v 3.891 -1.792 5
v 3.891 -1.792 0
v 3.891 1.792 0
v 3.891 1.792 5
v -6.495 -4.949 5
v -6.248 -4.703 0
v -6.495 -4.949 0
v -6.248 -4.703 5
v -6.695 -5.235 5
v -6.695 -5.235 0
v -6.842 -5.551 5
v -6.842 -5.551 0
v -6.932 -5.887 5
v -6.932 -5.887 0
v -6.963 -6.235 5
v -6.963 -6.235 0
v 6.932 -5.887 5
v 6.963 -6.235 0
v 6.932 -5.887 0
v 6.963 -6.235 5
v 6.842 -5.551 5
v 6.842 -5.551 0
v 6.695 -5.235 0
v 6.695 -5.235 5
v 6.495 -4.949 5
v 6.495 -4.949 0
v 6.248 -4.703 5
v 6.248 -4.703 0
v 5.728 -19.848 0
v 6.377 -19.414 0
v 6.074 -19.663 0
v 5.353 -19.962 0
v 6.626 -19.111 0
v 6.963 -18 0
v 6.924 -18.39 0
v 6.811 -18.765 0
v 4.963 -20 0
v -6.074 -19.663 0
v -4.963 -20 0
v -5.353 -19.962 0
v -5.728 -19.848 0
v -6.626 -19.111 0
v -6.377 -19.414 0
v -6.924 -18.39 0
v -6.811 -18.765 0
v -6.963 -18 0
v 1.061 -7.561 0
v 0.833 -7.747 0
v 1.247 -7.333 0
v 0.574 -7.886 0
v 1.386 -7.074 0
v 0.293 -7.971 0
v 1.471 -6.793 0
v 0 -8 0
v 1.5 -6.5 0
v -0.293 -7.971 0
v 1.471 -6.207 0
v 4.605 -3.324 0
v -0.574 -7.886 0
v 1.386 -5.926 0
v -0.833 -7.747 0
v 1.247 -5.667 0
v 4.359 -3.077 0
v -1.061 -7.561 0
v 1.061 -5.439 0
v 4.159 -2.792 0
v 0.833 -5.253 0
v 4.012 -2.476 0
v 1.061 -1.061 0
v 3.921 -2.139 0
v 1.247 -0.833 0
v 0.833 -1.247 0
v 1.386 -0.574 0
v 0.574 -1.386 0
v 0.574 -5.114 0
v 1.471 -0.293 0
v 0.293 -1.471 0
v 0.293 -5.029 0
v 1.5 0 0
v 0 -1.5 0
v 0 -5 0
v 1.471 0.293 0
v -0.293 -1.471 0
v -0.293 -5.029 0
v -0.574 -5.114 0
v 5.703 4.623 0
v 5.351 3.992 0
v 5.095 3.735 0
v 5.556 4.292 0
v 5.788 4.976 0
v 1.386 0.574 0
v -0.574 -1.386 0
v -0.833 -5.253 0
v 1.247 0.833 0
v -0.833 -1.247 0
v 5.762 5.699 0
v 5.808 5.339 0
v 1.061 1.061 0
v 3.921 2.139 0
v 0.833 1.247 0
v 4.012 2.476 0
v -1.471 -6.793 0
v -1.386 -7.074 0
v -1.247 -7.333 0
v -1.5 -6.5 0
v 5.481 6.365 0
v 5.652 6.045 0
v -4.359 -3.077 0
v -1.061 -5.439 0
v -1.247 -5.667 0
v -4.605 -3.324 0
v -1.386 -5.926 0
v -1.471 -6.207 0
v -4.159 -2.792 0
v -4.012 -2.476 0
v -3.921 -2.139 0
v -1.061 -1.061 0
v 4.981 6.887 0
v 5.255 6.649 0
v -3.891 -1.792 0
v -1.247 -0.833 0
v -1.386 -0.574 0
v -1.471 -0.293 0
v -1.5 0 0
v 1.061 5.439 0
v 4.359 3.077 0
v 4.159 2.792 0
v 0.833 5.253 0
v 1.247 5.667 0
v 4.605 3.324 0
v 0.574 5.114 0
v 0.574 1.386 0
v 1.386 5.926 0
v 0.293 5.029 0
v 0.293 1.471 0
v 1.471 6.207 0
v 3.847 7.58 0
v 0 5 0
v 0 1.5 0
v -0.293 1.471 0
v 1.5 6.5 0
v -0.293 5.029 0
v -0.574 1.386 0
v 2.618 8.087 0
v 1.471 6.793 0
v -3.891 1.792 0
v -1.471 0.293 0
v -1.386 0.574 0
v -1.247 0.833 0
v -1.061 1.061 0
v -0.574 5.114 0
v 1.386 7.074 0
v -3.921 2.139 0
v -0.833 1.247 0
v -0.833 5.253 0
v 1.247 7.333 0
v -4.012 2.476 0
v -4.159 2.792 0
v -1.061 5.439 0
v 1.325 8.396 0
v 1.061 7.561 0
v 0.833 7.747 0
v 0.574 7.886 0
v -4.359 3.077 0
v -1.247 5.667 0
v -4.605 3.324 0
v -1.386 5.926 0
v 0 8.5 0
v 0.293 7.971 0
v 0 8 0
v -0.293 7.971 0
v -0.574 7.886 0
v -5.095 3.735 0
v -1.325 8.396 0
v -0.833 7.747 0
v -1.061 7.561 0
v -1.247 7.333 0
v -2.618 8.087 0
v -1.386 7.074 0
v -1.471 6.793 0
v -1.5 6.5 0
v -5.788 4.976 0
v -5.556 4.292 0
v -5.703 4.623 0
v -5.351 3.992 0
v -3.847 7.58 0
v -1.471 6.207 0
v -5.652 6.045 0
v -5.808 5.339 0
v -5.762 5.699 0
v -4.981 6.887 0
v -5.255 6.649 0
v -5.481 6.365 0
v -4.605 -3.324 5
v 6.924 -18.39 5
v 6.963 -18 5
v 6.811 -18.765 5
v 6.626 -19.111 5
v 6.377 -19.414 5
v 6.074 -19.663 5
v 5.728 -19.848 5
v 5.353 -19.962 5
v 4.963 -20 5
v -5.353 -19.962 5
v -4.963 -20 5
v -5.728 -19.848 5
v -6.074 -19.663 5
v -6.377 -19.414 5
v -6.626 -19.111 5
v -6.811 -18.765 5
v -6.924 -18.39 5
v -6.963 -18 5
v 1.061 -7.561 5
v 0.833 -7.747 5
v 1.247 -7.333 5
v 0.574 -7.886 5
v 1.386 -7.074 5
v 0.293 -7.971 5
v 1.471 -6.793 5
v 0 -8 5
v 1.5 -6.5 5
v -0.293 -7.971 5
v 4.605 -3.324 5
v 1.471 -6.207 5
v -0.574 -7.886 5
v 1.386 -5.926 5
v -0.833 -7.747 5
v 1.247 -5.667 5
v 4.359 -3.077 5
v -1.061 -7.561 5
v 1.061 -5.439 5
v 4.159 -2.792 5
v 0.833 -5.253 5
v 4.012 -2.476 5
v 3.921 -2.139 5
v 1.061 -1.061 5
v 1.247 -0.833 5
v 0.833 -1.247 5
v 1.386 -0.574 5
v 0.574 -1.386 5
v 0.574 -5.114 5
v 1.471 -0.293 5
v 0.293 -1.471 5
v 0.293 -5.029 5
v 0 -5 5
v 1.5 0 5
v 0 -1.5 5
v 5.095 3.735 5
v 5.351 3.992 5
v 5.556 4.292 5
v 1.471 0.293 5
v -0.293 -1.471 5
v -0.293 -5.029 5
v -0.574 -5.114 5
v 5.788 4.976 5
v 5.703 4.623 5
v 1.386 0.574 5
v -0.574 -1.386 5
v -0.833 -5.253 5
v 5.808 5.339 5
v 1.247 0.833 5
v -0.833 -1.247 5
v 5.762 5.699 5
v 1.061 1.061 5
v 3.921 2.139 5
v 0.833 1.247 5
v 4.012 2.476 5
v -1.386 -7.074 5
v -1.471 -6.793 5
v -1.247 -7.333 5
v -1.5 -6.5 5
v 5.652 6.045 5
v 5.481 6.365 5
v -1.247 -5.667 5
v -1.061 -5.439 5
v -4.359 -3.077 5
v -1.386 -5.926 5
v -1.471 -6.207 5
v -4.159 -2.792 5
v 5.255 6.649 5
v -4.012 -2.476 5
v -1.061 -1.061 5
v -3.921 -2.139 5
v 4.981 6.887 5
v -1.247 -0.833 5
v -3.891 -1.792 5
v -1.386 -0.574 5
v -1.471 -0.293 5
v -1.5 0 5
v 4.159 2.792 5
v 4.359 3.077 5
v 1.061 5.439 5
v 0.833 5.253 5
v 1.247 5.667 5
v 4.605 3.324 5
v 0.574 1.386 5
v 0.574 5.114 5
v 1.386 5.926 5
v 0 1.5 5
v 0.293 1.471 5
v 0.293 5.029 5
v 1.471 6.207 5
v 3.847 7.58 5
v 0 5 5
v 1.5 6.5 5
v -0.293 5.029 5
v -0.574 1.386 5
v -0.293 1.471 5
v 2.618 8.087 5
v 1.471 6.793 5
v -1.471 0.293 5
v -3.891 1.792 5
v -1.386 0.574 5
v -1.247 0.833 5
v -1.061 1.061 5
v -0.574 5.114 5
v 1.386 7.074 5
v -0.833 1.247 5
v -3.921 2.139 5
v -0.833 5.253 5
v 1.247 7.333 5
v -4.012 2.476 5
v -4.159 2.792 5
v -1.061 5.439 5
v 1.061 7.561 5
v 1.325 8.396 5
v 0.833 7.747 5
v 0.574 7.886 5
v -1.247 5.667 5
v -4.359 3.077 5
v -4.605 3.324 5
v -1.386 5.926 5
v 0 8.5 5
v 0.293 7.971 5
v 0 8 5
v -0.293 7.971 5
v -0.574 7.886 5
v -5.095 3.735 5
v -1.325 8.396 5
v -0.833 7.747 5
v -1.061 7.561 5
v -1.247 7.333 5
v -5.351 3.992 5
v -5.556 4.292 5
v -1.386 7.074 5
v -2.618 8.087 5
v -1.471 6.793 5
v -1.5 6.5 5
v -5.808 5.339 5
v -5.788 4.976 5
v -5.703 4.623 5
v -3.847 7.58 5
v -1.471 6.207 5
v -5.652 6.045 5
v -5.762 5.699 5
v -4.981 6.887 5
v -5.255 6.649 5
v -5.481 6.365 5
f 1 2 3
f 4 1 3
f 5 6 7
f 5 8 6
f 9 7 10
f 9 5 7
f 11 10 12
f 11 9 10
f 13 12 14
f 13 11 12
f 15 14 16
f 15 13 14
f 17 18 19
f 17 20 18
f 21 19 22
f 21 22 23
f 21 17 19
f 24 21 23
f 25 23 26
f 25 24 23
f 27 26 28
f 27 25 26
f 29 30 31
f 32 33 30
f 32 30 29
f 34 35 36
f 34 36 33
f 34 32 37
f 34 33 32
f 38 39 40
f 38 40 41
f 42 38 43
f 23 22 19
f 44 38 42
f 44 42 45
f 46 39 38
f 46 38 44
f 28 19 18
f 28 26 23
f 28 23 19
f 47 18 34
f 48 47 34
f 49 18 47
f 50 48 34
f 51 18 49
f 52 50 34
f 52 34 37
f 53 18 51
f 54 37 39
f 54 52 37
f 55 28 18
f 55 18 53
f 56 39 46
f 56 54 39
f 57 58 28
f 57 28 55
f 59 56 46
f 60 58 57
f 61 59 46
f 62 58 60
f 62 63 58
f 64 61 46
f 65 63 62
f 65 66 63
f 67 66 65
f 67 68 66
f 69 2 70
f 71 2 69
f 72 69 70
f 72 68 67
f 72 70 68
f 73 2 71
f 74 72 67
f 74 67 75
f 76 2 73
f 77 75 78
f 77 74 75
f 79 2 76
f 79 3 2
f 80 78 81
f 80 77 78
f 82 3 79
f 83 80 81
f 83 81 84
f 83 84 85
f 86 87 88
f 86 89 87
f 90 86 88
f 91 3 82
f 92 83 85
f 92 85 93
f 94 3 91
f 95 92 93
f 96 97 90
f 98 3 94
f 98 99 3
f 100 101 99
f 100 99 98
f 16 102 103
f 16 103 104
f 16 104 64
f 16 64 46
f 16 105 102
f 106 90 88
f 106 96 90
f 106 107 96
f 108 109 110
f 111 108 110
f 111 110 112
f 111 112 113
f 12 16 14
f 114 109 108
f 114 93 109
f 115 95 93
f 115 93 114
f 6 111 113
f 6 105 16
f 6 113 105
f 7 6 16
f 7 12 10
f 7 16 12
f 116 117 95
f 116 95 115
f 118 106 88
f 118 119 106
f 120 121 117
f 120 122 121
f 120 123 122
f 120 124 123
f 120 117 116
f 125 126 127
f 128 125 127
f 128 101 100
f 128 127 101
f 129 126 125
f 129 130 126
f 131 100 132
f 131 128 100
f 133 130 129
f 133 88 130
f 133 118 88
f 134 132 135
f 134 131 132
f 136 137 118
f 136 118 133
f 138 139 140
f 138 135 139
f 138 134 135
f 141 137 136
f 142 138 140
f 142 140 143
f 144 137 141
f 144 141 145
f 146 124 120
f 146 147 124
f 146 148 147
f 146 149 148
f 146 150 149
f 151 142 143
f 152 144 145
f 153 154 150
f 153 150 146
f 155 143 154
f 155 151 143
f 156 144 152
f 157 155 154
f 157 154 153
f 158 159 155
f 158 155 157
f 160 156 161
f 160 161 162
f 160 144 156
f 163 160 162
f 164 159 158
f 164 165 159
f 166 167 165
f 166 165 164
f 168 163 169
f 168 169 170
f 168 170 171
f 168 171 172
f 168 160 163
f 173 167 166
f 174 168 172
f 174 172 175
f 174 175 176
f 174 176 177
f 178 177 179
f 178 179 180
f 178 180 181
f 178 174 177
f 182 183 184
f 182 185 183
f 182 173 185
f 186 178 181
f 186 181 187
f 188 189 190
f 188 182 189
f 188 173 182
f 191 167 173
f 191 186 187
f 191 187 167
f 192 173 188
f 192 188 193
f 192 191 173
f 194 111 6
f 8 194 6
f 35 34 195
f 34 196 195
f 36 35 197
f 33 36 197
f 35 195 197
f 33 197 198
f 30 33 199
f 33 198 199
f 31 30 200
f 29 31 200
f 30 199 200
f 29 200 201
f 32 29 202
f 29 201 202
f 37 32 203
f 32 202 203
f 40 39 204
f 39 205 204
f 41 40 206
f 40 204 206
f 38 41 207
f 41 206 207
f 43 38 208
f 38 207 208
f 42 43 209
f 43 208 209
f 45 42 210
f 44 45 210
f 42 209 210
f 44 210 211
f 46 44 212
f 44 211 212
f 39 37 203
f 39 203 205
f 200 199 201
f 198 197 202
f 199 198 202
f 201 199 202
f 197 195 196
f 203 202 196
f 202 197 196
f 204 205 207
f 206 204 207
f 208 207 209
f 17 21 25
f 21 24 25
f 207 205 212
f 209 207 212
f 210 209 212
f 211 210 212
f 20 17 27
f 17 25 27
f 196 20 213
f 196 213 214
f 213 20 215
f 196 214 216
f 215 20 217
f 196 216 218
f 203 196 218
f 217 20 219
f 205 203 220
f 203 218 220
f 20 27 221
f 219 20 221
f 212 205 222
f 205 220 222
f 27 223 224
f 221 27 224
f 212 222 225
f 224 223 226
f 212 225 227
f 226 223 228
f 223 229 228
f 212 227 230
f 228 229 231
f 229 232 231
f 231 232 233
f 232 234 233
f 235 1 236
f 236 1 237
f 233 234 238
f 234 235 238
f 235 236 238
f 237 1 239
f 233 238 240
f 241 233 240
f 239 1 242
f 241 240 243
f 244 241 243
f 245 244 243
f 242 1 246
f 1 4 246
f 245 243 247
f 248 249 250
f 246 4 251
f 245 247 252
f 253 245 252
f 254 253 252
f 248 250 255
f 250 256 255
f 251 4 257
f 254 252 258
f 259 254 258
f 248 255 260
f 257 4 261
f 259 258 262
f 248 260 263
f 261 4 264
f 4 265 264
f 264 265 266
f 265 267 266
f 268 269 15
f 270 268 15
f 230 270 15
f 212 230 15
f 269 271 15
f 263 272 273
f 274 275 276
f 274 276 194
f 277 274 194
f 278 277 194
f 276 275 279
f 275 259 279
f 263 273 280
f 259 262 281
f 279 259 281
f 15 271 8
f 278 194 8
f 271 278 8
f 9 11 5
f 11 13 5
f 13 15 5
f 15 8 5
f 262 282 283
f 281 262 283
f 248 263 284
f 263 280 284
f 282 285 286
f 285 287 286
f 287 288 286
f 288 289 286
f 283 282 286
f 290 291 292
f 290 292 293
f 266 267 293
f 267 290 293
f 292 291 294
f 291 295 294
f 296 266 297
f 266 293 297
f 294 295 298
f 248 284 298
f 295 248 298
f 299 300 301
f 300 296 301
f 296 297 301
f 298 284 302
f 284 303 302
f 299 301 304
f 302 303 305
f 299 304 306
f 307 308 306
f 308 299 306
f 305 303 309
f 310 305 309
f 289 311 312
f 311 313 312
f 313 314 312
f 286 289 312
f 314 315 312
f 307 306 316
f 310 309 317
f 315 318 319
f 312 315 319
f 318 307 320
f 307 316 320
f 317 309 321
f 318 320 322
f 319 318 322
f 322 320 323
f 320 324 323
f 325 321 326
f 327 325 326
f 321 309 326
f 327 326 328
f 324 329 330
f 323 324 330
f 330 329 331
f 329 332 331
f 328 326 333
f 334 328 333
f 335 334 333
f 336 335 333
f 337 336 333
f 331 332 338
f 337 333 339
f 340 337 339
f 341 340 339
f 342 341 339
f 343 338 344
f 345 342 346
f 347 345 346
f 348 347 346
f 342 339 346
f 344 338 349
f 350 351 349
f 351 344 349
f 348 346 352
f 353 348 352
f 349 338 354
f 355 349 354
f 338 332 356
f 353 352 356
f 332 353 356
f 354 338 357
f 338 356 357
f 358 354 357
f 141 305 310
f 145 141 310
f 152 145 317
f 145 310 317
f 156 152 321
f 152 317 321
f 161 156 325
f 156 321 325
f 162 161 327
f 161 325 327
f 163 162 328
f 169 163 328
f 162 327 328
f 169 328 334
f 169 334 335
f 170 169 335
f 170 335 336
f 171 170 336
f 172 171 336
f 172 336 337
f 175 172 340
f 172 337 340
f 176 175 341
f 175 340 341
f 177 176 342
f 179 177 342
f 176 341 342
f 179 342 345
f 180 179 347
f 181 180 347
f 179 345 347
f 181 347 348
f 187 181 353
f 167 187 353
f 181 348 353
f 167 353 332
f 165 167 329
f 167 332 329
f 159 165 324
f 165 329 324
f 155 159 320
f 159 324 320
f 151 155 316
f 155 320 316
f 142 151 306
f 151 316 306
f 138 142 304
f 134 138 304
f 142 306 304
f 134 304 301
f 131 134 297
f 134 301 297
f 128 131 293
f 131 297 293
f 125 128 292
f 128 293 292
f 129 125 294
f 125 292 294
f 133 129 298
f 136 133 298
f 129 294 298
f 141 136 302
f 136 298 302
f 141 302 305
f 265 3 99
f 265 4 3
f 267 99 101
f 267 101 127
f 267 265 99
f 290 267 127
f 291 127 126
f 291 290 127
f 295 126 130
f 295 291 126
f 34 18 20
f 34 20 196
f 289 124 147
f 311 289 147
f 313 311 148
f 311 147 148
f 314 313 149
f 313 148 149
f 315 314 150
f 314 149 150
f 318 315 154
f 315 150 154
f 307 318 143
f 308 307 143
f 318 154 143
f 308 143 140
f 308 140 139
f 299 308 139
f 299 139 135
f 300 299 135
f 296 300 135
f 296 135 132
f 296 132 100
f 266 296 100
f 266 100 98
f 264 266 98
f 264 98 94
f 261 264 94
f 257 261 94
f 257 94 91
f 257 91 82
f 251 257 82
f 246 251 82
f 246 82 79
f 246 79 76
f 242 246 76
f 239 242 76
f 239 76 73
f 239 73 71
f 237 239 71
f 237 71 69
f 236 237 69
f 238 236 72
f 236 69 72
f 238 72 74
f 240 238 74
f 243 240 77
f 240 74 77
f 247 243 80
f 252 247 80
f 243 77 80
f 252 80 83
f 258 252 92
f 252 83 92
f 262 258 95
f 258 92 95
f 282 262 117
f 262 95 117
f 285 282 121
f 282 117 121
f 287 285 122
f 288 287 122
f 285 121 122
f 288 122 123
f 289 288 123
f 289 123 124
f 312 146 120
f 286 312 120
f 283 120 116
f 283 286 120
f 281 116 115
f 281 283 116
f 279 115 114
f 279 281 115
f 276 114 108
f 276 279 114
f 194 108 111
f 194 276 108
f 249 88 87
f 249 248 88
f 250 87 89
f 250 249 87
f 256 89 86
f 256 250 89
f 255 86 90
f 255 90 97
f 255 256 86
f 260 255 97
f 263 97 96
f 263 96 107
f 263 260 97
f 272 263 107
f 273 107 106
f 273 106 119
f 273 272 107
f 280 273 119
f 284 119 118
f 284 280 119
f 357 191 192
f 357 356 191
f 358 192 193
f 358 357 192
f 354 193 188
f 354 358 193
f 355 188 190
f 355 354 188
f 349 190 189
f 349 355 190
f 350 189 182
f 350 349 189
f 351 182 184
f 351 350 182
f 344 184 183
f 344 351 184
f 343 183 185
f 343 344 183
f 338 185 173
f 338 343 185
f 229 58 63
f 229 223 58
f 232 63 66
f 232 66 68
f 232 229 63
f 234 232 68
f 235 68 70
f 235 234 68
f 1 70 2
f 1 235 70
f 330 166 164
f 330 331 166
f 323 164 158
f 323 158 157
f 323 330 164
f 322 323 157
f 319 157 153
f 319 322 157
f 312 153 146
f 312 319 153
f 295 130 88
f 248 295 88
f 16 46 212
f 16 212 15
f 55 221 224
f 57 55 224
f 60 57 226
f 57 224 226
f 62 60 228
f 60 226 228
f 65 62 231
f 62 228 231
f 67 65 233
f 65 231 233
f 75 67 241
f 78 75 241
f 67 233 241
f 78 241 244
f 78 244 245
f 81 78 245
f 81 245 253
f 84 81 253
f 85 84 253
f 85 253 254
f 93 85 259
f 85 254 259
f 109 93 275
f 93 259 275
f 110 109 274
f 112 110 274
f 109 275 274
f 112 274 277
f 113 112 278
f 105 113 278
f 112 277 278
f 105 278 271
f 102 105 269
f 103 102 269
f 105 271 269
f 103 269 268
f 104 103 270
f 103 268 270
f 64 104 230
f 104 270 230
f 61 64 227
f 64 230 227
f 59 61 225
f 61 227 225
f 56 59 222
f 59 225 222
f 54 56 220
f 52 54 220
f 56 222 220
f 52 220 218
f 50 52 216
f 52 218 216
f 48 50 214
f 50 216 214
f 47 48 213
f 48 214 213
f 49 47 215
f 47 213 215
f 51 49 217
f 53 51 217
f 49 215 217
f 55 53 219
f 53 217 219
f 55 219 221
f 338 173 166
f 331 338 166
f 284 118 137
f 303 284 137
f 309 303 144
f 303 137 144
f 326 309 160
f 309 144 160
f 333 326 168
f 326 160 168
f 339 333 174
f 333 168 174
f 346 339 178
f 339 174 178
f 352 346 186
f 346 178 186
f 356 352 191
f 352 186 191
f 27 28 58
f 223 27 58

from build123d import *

# Parameters (mm, degrees)
SKETCH_1_R          = 8.5
EXTRUDE_1_DEPTH     = 5
SKETCH_2_R          = 1.5
CUT_EXTRUDE_1_DEPTH = 5
CUT_EXTRUDE_2_DEPTH = 14.019216566
EXTRUDE_2_DEPTH     = 5
SKETCH_6_R          = 1.5
CUT_EXTRUDE_3_DEPTH = 22.759606561
FILLET_2_R          = 2


with BuildPart() as part:
    # 草图1 → 凸台-拉伸1 (new body)
    with BuildSketch(Plane.XY):
        Circle(SKETCH_1_R)
    extrude(amount=EXTRUDE_1_DEPTH)

    # 草图2 → 切除-拉伸1 (cut)
    with BuildSketch(Plane.XY.offset(5)):
        with Locations((0, 6.5)):
            Circle(SKETCH_2_R)
        with Locations((0, -6.5)):
            Circle(SKETCH_2_R)
    extrude(amount=-CUT_EXTRUDE_1_DEPTH, mode=Mode.SUBTRACT)

    # 草图3 → 切除-拉伸2 (cut, through all)
    with BuildSketch(Plane(origin=(0, 0, 0), x_dir=(-1, 0, 0), z_dir=(0, 0, -1))):
        with BuildLine():
            ThreePointArc((3.89097221, 2.724488073), (4.530155516, 1.428352548), (4.75, 0))
            Line((4.75, 0), (8.5, 0))
            ThreePointArc((8.5, 0), (8.106594081, 2.555999296), (6.962792376, 4.875399709))
            Line((6.962792376, 4.875399709), (3.89097221, 2.724488073))
        make_face()
        with BuildLine():
            Line((8.5, 0), (4.75, 0))
            ThreePointArc((4.75, 0), (4.530155516, -1.428352548), (3.89097221, -2.724488073))
            Line((3.89097221, -2.724488073), (6.962792376, -4.875399709))
            ThreePointArc((6.962792376, -4.875399709), (8.106594081, -2.555999296), (8.5, 0))
        make_face()
    cut_extrude_2 = extrude(amount=-CUT_EXTRUDE_2_DEPTH, mode=Mode.SUBTRACT)

    # 镜向1: 切除-拉伸2 across plane
    add(cut_extrude_2.mirror(Plane(origin=(0, 0, 0), x_dir=(0, 0, 1), z_dir=(1, 0, 0))), mode=Mode.SUBTRACT)


with BuildPart() as body_2:
    # 草图4 → 凸台-拉伸2 (new body)
    with BuildSketch(Plane(origin=(0, 0, 0), x_dir=(-1, 0, 0), z_dir=(0, 0, -1))):
        with BuildLine():
            ThreePointArc((6.962792376, -4.875399709), (0, -8.5), (-6.962792376, -4.875399709))
            Line((-6.962792376, -4.875399709), (-6.962792376, -20))
            Line((-6.962792376, -20), (6.962792376, -20))
            Line((6.962792376, -20), (6.962792376, -4.875399709))
        make_face()
    extrude(amount=-EXTRUDE_2_DEPTH)


with BuildPart() as part_1:
    add(part.part)

    # Combine 1: union body 2
    add(body_2.part)

    # 草图6 → 切除-拉伸3 (cut, through all)
    with BuildSketch(Plane(origin=(0, 0, 0), x_dir=(-1, 0, 0), z_dir=(0, 0, -1))):
        with BuildLine():
            Line((-6.962792376, 4.875399709), (-3.89097221, 2.724488073))
            Line((-3.89097221, 2.724488073), (-6.769757712, 5.140075925))
            ThreePointArc((-6.769757712, 5.140075925), (-6.867550244, 5.008667851), (-6.962792376, 4.875399709))
        make_face()
        with BuildLine():
            Line((-3.89097221, -2.724488073), (-3.89097221, 2.724488073))
            ThreePointArc((-3.89097221, 2.724488073), (-4.75, 0), (-3.89097221, -2.724488073))
        make_face()
        Polygon((-6.962792376, -5.302051241), (-3.89097221, -2.724488073), (-6.962792376, -4.875399709), align=None)
        with BuildLine():
            ThreePointArc((6.962792376, 4.875399709), (6.867550244, 5.008667851), (6.769757712, 5.140075925))
            Line((6.769757712, 5.140075925), (3.89097221, 2.724488073))
            Line((3.89097221, 2.724488073), (6.962792376, 4.875399709))
        make_face()
        with BuildLine():
            ThreePointArc((3.89097221, -2.724488073), (4.75, 0), (3.89097221, 2.724488073))
            Line((3.89097221, 2.724488073), (3.89097221, -2.724488073))
        make_face()
        Polygon((6.962792376, -4.875399709), (3.89097221, -2.724488073), (6.962792376, -5.302051241), align=None)
        Circle(SKETCH_6_R)
    extrude(amount=-CUT_EXTRUDE_3_DEPTH, mode=Mode.SUBTRACT)

    # 圆角2
    fillet_2_edges = [part_1.edges().sort_by_distance(p)[0] for p in [
        (-6.769757712, 5.140075925, 2.5),
        (6.769757712, 5.140075925, 2.5),
        (-3.89097221, -2.724488073, 2.5),
        (-3.89097221, 2.724488073, 2.5),
        (3.89097221, 2.724488073, 2.5),
        (3.89097221, -2.724488073, 2.5),
        (-6.962792376, -20, 2.5),
        (6.962792376, -20, 2.5),
        (6.962792376, -5.302051241, 2.5),
        (-6.962792376, -5.302051241, 2.5),
    ]]
    fillet(fillet_2_edges, radius=FILLET_2_R)


solid = part_1.part
